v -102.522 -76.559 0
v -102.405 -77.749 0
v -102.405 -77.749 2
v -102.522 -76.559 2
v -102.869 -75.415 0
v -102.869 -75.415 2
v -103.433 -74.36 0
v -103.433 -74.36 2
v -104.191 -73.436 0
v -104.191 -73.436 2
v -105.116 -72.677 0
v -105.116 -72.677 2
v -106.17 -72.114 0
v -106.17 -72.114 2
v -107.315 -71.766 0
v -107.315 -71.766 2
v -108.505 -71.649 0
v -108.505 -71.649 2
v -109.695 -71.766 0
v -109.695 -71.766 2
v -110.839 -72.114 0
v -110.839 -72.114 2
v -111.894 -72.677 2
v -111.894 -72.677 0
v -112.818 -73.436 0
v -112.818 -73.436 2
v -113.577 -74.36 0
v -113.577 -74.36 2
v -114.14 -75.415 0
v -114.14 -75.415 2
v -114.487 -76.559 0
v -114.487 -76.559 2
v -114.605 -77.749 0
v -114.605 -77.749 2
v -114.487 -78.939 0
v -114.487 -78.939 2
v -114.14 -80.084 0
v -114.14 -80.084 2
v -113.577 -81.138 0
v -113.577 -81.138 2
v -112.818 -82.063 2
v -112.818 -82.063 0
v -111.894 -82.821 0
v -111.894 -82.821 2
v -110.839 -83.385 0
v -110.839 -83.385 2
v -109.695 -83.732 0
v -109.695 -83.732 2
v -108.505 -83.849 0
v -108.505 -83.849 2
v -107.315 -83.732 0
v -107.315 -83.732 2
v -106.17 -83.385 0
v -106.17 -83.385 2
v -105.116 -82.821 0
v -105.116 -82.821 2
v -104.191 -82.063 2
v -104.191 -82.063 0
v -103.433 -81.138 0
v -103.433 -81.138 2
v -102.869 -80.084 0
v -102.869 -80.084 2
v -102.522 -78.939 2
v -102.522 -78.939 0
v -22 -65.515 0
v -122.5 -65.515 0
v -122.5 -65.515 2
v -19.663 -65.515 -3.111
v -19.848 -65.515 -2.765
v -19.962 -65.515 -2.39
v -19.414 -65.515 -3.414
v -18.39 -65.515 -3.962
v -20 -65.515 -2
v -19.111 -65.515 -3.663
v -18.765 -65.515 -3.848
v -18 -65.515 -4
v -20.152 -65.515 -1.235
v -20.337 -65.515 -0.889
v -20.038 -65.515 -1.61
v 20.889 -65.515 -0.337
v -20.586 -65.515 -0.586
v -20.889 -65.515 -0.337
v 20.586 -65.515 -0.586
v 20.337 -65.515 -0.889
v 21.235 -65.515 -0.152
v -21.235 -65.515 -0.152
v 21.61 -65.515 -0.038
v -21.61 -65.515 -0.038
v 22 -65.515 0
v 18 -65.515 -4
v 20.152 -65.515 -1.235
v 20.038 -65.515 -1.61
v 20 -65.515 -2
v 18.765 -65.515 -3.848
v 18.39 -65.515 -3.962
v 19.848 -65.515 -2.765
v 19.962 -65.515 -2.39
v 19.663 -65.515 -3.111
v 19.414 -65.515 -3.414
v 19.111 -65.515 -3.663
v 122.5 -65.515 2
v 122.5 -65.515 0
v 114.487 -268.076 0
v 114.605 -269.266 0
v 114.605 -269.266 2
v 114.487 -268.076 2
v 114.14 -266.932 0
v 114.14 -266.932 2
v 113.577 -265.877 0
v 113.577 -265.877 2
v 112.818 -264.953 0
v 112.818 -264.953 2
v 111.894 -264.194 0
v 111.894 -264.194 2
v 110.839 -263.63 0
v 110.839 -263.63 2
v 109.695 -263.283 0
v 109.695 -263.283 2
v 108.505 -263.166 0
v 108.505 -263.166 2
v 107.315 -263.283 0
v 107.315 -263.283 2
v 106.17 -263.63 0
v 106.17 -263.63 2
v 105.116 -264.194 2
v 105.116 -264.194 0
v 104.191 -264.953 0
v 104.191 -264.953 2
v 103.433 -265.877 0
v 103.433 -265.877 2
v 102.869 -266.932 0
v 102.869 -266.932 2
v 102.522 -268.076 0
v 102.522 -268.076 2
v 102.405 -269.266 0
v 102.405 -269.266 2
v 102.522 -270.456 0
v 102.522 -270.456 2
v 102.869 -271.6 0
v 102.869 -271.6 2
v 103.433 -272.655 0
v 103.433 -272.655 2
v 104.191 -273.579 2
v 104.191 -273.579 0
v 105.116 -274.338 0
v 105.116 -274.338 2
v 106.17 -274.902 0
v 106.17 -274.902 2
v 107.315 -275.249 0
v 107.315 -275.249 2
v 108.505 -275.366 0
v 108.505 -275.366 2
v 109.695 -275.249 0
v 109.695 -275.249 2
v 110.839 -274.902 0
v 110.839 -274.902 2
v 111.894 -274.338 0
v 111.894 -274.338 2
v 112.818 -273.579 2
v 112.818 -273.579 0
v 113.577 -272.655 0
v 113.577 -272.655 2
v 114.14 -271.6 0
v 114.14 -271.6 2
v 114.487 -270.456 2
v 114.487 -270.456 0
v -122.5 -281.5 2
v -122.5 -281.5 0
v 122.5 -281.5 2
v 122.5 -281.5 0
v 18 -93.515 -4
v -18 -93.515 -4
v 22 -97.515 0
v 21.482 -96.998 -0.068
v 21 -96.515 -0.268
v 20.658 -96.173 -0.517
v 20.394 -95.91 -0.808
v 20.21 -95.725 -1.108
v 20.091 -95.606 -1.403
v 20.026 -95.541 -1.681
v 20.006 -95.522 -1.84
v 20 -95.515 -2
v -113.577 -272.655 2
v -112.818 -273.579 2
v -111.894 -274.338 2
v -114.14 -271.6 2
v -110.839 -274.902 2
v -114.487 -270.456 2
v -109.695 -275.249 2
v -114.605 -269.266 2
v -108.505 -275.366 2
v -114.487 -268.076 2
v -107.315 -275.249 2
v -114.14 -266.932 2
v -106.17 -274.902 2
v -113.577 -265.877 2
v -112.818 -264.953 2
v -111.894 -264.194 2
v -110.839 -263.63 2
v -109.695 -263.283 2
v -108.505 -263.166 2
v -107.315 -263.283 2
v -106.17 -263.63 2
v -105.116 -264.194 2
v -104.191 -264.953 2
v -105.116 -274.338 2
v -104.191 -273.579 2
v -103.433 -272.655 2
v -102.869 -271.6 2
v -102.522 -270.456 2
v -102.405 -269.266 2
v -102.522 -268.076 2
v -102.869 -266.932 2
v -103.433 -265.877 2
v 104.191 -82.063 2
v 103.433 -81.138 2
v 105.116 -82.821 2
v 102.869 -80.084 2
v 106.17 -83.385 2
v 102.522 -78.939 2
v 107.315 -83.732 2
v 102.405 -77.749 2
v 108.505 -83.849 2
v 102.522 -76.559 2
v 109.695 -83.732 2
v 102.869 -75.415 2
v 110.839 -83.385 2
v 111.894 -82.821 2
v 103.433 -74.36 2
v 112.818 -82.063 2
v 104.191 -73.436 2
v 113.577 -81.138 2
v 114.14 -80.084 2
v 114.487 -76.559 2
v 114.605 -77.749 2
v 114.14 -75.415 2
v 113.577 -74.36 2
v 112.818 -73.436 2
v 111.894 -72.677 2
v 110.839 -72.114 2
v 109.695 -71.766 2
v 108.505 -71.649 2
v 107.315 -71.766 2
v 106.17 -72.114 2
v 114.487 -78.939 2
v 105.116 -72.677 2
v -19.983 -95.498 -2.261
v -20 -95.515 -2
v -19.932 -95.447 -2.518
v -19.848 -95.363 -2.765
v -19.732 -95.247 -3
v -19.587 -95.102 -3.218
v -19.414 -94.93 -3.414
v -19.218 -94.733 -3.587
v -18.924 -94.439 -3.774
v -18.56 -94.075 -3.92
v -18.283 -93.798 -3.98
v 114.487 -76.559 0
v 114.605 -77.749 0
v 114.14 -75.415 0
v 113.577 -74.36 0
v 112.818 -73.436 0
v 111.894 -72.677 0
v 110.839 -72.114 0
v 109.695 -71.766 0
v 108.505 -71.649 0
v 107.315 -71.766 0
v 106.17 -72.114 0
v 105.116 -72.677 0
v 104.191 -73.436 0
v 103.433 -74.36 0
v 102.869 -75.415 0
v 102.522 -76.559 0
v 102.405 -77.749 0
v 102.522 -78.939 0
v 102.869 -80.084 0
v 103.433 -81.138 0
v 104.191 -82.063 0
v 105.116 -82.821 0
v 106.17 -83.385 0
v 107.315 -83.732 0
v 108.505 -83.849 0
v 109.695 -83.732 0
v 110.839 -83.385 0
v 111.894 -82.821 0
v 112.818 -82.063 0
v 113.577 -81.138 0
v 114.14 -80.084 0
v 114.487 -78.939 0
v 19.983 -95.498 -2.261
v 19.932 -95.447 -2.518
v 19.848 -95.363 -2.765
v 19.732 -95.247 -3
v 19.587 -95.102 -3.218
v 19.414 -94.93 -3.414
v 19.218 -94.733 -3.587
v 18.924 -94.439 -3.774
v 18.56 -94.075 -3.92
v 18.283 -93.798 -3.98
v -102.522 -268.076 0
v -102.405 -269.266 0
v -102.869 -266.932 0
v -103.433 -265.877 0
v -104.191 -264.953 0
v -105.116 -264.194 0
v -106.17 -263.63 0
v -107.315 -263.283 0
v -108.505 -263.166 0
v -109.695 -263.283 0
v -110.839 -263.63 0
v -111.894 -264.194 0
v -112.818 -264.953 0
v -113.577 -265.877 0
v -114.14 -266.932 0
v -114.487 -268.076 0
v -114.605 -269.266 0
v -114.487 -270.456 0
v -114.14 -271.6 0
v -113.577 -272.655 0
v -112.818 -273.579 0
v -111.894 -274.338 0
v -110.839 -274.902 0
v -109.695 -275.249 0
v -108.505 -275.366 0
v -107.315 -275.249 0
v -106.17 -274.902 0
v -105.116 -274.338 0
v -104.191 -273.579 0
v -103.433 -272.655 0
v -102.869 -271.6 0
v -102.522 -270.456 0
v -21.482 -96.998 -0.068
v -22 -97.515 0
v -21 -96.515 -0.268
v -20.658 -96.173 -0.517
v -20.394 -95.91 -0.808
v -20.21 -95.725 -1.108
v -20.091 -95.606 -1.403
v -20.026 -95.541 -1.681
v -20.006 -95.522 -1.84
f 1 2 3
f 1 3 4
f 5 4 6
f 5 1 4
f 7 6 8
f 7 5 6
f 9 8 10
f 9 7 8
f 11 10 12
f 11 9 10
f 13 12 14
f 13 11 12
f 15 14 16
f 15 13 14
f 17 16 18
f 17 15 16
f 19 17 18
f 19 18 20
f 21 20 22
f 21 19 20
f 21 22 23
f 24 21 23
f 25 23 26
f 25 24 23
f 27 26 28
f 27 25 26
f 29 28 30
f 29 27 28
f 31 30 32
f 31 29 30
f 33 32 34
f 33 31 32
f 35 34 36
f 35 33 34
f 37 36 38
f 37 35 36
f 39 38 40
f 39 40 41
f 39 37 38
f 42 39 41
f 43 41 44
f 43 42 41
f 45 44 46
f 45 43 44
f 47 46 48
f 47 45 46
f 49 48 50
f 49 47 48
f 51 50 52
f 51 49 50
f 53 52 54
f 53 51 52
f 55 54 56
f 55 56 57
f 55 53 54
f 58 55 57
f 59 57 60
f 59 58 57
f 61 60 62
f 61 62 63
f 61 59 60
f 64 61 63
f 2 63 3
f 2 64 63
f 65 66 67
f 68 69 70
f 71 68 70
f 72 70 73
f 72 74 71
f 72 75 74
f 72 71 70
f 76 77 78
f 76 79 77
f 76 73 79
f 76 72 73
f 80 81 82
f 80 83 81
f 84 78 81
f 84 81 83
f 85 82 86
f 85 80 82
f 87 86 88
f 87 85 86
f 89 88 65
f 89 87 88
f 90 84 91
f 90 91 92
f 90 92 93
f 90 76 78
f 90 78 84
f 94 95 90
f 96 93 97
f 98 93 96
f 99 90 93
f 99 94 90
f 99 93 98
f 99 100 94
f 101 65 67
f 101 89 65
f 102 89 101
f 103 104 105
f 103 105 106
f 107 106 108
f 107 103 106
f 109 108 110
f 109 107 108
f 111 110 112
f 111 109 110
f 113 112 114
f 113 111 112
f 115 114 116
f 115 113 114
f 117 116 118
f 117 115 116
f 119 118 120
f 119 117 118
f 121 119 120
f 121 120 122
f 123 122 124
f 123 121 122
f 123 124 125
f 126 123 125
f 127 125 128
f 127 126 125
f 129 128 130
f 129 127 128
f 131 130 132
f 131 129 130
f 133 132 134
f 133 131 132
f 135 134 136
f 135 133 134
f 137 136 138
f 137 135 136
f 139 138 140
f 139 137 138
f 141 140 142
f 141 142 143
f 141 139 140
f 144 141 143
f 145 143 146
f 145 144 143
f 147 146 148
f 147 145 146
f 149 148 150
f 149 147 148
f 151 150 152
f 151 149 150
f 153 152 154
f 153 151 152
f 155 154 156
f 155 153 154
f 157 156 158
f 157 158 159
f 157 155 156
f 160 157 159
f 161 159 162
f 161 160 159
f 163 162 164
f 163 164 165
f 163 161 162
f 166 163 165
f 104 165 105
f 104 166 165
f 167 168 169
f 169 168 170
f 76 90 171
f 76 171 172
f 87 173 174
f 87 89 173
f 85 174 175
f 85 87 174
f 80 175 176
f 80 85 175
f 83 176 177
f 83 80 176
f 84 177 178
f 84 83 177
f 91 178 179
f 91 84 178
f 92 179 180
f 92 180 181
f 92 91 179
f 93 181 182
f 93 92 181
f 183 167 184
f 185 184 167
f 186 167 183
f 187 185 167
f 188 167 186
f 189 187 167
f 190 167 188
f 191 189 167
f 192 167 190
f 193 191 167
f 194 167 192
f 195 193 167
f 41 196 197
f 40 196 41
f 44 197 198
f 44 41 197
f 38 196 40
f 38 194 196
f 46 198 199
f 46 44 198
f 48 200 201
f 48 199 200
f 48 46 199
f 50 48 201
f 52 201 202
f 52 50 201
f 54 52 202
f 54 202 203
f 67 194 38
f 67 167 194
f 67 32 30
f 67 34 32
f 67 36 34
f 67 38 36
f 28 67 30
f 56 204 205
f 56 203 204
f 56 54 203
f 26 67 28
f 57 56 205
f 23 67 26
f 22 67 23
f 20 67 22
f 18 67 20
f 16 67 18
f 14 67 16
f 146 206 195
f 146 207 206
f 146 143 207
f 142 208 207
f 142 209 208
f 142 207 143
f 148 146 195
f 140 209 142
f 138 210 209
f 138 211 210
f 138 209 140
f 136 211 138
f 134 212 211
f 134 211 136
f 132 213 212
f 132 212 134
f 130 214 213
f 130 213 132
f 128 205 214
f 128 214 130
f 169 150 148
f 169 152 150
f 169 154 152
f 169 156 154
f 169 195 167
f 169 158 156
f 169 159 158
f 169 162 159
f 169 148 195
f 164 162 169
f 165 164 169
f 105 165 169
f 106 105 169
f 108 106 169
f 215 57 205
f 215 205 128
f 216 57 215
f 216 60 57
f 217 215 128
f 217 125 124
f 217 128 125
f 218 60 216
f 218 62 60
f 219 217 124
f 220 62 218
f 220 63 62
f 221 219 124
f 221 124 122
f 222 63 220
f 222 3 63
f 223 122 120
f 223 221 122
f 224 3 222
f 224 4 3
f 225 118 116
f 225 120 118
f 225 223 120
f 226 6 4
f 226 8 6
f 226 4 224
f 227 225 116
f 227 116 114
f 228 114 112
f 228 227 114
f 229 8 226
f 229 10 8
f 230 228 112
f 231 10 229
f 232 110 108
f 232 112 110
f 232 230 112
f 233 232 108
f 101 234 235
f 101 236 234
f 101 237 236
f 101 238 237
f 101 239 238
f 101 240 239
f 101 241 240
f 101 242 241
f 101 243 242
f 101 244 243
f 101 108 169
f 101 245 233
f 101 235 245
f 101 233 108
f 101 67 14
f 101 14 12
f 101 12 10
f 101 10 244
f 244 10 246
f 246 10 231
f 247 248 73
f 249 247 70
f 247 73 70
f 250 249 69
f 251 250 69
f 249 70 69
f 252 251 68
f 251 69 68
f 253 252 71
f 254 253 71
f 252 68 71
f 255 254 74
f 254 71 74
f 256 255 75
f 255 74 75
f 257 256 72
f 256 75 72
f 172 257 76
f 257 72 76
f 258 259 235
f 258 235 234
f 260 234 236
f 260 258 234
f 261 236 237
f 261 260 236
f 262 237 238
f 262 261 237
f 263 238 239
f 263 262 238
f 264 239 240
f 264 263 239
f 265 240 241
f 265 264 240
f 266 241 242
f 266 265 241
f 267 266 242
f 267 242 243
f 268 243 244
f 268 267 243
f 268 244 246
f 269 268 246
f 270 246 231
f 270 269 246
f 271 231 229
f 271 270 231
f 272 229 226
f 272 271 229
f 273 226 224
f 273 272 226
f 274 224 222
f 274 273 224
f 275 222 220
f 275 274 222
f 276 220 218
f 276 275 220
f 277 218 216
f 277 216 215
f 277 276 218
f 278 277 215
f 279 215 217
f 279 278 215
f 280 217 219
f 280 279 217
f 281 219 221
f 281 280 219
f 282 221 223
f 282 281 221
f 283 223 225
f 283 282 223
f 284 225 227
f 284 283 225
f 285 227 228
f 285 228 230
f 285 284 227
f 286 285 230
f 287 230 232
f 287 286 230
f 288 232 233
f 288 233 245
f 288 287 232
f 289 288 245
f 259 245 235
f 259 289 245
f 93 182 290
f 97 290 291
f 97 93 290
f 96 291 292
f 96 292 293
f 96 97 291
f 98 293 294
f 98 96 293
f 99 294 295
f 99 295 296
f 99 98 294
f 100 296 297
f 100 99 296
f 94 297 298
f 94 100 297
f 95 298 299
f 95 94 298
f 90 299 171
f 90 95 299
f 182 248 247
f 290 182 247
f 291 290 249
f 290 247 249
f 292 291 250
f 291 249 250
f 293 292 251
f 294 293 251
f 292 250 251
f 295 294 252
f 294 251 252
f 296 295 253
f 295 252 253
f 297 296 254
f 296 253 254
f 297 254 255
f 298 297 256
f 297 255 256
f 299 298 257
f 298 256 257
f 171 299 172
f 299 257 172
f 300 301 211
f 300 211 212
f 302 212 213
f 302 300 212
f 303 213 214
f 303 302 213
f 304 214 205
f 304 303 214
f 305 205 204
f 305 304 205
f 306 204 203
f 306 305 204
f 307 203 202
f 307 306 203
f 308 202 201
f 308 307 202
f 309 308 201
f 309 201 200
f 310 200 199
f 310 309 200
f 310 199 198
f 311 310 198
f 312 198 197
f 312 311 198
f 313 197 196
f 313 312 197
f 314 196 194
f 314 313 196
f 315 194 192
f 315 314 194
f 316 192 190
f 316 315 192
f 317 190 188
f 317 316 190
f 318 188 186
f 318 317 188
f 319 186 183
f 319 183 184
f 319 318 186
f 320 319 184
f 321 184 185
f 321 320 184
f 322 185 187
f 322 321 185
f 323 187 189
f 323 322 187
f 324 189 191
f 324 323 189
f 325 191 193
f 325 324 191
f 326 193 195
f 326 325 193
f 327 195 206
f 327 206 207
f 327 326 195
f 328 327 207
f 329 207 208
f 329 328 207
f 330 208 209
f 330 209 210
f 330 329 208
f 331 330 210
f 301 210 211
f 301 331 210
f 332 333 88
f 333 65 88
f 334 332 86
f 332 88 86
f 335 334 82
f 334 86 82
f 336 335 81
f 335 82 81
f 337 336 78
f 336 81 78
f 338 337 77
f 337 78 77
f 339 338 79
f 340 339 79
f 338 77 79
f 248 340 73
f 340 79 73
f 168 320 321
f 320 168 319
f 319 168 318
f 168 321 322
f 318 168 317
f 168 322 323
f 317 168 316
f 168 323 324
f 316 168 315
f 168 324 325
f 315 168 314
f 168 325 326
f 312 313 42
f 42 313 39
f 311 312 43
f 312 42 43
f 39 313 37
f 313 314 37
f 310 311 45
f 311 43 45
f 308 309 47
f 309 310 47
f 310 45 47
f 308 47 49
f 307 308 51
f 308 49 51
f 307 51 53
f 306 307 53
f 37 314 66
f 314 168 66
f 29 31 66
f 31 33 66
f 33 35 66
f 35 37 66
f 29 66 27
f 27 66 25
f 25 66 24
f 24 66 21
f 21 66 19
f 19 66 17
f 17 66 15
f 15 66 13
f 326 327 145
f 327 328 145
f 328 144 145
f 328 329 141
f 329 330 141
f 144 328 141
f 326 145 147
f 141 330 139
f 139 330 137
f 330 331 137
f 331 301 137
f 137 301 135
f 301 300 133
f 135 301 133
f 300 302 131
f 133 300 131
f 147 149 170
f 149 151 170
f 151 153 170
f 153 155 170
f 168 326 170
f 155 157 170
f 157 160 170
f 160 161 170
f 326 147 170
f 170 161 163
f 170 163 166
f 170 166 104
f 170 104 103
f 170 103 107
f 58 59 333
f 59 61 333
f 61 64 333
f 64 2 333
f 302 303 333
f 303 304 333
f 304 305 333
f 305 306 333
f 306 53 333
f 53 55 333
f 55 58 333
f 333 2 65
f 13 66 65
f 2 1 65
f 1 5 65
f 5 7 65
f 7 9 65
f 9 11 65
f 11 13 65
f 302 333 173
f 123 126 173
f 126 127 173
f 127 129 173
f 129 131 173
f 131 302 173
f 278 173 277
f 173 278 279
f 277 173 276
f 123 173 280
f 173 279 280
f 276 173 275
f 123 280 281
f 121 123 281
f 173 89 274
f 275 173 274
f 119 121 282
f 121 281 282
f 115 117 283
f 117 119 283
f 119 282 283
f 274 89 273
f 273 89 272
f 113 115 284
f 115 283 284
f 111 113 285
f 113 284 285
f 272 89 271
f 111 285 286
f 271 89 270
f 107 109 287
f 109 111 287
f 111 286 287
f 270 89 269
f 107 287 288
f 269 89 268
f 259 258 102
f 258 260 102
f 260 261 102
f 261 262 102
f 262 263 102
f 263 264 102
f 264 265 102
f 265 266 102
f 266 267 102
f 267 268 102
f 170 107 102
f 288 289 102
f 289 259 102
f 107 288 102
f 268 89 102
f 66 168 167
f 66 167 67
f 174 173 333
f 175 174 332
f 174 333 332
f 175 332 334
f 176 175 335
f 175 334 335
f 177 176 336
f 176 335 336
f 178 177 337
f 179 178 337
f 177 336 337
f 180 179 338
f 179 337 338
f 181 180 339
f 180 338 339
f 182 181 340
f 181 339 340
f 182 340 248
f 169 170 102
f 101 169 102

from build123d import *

# Parameters (mm, degrees)
CROQUIS1_W              = 245
CROQUIS1_H              = 215.984697531
CROQUIS1_R              = 6.1
SALIENTE_EXTRUIR1_DEPTH = 2
CROQUIS2_W              = 40
CROQUIS2_H              = 30
SALIENTE_EXTRUIR2_DEPTH = 4
REDONDEO1_R             = 2


with BuildPart() as part:
    # Croquis1 → Saliente-Extruir1 (new body)
    with BuildSketch(Plane.XY):
        with Locations((0, -173.507651235)):
            Rectangle(CROQUIS1_W, CROQUIS1_H)
        with Locations((-108.504553774, -269.266081741)):
            Circle(CROQUIS1_R, mode=Mode.SUBTRACT)
        with Locations((108.504553774, -269.266081741)):
            Circle(CROQUIS1_R, mode=Mode.SUBTRACT)
        with Locations((108.504553774, -77.749220728)):
            Circle(CROQUIS1_R, mode=Mode.SUBTRACT)
        with Locations((-108.504553774, -77.749220728)):
            Circle(CROQUIS1_R, mode=Mode.SUBTRACT)
    extrude(amount=SALIENTE_EXTRUIR1_DEPTH)

    # Croquis2 → Saliente-Extruir2 (add)
    with BuildSketch(Plane(origin=(0, 0, 0), x_dir=(-1, 0, 0), z_dir=(0, 0, -1))):
        with Locations((0, -80.515302469)):
            Rectangle(CROQUIS2_W, CROQUIS2_H)
    extrude(amount=SALIENTE_EXTRUIR2_DEPTH)

    # Redondeo1
    redondeo1_edges = [part.edges().sort_by_distance(p)[0] for p in [
        (-20, -80.515302469, -4),
        (-20, -80.515302469, 0),
        (0, -95.515302469, 0),
        (20, -80.515302469, 0),
        (0, -95.515302469, -4),
        (20, -80.515302469, -4),
    ]]
    fillet(redondeo1_edges, radius=REDONDEO1_R - 0.0001)  # a hair under: the kernel refuses the full size


solid = part.part
